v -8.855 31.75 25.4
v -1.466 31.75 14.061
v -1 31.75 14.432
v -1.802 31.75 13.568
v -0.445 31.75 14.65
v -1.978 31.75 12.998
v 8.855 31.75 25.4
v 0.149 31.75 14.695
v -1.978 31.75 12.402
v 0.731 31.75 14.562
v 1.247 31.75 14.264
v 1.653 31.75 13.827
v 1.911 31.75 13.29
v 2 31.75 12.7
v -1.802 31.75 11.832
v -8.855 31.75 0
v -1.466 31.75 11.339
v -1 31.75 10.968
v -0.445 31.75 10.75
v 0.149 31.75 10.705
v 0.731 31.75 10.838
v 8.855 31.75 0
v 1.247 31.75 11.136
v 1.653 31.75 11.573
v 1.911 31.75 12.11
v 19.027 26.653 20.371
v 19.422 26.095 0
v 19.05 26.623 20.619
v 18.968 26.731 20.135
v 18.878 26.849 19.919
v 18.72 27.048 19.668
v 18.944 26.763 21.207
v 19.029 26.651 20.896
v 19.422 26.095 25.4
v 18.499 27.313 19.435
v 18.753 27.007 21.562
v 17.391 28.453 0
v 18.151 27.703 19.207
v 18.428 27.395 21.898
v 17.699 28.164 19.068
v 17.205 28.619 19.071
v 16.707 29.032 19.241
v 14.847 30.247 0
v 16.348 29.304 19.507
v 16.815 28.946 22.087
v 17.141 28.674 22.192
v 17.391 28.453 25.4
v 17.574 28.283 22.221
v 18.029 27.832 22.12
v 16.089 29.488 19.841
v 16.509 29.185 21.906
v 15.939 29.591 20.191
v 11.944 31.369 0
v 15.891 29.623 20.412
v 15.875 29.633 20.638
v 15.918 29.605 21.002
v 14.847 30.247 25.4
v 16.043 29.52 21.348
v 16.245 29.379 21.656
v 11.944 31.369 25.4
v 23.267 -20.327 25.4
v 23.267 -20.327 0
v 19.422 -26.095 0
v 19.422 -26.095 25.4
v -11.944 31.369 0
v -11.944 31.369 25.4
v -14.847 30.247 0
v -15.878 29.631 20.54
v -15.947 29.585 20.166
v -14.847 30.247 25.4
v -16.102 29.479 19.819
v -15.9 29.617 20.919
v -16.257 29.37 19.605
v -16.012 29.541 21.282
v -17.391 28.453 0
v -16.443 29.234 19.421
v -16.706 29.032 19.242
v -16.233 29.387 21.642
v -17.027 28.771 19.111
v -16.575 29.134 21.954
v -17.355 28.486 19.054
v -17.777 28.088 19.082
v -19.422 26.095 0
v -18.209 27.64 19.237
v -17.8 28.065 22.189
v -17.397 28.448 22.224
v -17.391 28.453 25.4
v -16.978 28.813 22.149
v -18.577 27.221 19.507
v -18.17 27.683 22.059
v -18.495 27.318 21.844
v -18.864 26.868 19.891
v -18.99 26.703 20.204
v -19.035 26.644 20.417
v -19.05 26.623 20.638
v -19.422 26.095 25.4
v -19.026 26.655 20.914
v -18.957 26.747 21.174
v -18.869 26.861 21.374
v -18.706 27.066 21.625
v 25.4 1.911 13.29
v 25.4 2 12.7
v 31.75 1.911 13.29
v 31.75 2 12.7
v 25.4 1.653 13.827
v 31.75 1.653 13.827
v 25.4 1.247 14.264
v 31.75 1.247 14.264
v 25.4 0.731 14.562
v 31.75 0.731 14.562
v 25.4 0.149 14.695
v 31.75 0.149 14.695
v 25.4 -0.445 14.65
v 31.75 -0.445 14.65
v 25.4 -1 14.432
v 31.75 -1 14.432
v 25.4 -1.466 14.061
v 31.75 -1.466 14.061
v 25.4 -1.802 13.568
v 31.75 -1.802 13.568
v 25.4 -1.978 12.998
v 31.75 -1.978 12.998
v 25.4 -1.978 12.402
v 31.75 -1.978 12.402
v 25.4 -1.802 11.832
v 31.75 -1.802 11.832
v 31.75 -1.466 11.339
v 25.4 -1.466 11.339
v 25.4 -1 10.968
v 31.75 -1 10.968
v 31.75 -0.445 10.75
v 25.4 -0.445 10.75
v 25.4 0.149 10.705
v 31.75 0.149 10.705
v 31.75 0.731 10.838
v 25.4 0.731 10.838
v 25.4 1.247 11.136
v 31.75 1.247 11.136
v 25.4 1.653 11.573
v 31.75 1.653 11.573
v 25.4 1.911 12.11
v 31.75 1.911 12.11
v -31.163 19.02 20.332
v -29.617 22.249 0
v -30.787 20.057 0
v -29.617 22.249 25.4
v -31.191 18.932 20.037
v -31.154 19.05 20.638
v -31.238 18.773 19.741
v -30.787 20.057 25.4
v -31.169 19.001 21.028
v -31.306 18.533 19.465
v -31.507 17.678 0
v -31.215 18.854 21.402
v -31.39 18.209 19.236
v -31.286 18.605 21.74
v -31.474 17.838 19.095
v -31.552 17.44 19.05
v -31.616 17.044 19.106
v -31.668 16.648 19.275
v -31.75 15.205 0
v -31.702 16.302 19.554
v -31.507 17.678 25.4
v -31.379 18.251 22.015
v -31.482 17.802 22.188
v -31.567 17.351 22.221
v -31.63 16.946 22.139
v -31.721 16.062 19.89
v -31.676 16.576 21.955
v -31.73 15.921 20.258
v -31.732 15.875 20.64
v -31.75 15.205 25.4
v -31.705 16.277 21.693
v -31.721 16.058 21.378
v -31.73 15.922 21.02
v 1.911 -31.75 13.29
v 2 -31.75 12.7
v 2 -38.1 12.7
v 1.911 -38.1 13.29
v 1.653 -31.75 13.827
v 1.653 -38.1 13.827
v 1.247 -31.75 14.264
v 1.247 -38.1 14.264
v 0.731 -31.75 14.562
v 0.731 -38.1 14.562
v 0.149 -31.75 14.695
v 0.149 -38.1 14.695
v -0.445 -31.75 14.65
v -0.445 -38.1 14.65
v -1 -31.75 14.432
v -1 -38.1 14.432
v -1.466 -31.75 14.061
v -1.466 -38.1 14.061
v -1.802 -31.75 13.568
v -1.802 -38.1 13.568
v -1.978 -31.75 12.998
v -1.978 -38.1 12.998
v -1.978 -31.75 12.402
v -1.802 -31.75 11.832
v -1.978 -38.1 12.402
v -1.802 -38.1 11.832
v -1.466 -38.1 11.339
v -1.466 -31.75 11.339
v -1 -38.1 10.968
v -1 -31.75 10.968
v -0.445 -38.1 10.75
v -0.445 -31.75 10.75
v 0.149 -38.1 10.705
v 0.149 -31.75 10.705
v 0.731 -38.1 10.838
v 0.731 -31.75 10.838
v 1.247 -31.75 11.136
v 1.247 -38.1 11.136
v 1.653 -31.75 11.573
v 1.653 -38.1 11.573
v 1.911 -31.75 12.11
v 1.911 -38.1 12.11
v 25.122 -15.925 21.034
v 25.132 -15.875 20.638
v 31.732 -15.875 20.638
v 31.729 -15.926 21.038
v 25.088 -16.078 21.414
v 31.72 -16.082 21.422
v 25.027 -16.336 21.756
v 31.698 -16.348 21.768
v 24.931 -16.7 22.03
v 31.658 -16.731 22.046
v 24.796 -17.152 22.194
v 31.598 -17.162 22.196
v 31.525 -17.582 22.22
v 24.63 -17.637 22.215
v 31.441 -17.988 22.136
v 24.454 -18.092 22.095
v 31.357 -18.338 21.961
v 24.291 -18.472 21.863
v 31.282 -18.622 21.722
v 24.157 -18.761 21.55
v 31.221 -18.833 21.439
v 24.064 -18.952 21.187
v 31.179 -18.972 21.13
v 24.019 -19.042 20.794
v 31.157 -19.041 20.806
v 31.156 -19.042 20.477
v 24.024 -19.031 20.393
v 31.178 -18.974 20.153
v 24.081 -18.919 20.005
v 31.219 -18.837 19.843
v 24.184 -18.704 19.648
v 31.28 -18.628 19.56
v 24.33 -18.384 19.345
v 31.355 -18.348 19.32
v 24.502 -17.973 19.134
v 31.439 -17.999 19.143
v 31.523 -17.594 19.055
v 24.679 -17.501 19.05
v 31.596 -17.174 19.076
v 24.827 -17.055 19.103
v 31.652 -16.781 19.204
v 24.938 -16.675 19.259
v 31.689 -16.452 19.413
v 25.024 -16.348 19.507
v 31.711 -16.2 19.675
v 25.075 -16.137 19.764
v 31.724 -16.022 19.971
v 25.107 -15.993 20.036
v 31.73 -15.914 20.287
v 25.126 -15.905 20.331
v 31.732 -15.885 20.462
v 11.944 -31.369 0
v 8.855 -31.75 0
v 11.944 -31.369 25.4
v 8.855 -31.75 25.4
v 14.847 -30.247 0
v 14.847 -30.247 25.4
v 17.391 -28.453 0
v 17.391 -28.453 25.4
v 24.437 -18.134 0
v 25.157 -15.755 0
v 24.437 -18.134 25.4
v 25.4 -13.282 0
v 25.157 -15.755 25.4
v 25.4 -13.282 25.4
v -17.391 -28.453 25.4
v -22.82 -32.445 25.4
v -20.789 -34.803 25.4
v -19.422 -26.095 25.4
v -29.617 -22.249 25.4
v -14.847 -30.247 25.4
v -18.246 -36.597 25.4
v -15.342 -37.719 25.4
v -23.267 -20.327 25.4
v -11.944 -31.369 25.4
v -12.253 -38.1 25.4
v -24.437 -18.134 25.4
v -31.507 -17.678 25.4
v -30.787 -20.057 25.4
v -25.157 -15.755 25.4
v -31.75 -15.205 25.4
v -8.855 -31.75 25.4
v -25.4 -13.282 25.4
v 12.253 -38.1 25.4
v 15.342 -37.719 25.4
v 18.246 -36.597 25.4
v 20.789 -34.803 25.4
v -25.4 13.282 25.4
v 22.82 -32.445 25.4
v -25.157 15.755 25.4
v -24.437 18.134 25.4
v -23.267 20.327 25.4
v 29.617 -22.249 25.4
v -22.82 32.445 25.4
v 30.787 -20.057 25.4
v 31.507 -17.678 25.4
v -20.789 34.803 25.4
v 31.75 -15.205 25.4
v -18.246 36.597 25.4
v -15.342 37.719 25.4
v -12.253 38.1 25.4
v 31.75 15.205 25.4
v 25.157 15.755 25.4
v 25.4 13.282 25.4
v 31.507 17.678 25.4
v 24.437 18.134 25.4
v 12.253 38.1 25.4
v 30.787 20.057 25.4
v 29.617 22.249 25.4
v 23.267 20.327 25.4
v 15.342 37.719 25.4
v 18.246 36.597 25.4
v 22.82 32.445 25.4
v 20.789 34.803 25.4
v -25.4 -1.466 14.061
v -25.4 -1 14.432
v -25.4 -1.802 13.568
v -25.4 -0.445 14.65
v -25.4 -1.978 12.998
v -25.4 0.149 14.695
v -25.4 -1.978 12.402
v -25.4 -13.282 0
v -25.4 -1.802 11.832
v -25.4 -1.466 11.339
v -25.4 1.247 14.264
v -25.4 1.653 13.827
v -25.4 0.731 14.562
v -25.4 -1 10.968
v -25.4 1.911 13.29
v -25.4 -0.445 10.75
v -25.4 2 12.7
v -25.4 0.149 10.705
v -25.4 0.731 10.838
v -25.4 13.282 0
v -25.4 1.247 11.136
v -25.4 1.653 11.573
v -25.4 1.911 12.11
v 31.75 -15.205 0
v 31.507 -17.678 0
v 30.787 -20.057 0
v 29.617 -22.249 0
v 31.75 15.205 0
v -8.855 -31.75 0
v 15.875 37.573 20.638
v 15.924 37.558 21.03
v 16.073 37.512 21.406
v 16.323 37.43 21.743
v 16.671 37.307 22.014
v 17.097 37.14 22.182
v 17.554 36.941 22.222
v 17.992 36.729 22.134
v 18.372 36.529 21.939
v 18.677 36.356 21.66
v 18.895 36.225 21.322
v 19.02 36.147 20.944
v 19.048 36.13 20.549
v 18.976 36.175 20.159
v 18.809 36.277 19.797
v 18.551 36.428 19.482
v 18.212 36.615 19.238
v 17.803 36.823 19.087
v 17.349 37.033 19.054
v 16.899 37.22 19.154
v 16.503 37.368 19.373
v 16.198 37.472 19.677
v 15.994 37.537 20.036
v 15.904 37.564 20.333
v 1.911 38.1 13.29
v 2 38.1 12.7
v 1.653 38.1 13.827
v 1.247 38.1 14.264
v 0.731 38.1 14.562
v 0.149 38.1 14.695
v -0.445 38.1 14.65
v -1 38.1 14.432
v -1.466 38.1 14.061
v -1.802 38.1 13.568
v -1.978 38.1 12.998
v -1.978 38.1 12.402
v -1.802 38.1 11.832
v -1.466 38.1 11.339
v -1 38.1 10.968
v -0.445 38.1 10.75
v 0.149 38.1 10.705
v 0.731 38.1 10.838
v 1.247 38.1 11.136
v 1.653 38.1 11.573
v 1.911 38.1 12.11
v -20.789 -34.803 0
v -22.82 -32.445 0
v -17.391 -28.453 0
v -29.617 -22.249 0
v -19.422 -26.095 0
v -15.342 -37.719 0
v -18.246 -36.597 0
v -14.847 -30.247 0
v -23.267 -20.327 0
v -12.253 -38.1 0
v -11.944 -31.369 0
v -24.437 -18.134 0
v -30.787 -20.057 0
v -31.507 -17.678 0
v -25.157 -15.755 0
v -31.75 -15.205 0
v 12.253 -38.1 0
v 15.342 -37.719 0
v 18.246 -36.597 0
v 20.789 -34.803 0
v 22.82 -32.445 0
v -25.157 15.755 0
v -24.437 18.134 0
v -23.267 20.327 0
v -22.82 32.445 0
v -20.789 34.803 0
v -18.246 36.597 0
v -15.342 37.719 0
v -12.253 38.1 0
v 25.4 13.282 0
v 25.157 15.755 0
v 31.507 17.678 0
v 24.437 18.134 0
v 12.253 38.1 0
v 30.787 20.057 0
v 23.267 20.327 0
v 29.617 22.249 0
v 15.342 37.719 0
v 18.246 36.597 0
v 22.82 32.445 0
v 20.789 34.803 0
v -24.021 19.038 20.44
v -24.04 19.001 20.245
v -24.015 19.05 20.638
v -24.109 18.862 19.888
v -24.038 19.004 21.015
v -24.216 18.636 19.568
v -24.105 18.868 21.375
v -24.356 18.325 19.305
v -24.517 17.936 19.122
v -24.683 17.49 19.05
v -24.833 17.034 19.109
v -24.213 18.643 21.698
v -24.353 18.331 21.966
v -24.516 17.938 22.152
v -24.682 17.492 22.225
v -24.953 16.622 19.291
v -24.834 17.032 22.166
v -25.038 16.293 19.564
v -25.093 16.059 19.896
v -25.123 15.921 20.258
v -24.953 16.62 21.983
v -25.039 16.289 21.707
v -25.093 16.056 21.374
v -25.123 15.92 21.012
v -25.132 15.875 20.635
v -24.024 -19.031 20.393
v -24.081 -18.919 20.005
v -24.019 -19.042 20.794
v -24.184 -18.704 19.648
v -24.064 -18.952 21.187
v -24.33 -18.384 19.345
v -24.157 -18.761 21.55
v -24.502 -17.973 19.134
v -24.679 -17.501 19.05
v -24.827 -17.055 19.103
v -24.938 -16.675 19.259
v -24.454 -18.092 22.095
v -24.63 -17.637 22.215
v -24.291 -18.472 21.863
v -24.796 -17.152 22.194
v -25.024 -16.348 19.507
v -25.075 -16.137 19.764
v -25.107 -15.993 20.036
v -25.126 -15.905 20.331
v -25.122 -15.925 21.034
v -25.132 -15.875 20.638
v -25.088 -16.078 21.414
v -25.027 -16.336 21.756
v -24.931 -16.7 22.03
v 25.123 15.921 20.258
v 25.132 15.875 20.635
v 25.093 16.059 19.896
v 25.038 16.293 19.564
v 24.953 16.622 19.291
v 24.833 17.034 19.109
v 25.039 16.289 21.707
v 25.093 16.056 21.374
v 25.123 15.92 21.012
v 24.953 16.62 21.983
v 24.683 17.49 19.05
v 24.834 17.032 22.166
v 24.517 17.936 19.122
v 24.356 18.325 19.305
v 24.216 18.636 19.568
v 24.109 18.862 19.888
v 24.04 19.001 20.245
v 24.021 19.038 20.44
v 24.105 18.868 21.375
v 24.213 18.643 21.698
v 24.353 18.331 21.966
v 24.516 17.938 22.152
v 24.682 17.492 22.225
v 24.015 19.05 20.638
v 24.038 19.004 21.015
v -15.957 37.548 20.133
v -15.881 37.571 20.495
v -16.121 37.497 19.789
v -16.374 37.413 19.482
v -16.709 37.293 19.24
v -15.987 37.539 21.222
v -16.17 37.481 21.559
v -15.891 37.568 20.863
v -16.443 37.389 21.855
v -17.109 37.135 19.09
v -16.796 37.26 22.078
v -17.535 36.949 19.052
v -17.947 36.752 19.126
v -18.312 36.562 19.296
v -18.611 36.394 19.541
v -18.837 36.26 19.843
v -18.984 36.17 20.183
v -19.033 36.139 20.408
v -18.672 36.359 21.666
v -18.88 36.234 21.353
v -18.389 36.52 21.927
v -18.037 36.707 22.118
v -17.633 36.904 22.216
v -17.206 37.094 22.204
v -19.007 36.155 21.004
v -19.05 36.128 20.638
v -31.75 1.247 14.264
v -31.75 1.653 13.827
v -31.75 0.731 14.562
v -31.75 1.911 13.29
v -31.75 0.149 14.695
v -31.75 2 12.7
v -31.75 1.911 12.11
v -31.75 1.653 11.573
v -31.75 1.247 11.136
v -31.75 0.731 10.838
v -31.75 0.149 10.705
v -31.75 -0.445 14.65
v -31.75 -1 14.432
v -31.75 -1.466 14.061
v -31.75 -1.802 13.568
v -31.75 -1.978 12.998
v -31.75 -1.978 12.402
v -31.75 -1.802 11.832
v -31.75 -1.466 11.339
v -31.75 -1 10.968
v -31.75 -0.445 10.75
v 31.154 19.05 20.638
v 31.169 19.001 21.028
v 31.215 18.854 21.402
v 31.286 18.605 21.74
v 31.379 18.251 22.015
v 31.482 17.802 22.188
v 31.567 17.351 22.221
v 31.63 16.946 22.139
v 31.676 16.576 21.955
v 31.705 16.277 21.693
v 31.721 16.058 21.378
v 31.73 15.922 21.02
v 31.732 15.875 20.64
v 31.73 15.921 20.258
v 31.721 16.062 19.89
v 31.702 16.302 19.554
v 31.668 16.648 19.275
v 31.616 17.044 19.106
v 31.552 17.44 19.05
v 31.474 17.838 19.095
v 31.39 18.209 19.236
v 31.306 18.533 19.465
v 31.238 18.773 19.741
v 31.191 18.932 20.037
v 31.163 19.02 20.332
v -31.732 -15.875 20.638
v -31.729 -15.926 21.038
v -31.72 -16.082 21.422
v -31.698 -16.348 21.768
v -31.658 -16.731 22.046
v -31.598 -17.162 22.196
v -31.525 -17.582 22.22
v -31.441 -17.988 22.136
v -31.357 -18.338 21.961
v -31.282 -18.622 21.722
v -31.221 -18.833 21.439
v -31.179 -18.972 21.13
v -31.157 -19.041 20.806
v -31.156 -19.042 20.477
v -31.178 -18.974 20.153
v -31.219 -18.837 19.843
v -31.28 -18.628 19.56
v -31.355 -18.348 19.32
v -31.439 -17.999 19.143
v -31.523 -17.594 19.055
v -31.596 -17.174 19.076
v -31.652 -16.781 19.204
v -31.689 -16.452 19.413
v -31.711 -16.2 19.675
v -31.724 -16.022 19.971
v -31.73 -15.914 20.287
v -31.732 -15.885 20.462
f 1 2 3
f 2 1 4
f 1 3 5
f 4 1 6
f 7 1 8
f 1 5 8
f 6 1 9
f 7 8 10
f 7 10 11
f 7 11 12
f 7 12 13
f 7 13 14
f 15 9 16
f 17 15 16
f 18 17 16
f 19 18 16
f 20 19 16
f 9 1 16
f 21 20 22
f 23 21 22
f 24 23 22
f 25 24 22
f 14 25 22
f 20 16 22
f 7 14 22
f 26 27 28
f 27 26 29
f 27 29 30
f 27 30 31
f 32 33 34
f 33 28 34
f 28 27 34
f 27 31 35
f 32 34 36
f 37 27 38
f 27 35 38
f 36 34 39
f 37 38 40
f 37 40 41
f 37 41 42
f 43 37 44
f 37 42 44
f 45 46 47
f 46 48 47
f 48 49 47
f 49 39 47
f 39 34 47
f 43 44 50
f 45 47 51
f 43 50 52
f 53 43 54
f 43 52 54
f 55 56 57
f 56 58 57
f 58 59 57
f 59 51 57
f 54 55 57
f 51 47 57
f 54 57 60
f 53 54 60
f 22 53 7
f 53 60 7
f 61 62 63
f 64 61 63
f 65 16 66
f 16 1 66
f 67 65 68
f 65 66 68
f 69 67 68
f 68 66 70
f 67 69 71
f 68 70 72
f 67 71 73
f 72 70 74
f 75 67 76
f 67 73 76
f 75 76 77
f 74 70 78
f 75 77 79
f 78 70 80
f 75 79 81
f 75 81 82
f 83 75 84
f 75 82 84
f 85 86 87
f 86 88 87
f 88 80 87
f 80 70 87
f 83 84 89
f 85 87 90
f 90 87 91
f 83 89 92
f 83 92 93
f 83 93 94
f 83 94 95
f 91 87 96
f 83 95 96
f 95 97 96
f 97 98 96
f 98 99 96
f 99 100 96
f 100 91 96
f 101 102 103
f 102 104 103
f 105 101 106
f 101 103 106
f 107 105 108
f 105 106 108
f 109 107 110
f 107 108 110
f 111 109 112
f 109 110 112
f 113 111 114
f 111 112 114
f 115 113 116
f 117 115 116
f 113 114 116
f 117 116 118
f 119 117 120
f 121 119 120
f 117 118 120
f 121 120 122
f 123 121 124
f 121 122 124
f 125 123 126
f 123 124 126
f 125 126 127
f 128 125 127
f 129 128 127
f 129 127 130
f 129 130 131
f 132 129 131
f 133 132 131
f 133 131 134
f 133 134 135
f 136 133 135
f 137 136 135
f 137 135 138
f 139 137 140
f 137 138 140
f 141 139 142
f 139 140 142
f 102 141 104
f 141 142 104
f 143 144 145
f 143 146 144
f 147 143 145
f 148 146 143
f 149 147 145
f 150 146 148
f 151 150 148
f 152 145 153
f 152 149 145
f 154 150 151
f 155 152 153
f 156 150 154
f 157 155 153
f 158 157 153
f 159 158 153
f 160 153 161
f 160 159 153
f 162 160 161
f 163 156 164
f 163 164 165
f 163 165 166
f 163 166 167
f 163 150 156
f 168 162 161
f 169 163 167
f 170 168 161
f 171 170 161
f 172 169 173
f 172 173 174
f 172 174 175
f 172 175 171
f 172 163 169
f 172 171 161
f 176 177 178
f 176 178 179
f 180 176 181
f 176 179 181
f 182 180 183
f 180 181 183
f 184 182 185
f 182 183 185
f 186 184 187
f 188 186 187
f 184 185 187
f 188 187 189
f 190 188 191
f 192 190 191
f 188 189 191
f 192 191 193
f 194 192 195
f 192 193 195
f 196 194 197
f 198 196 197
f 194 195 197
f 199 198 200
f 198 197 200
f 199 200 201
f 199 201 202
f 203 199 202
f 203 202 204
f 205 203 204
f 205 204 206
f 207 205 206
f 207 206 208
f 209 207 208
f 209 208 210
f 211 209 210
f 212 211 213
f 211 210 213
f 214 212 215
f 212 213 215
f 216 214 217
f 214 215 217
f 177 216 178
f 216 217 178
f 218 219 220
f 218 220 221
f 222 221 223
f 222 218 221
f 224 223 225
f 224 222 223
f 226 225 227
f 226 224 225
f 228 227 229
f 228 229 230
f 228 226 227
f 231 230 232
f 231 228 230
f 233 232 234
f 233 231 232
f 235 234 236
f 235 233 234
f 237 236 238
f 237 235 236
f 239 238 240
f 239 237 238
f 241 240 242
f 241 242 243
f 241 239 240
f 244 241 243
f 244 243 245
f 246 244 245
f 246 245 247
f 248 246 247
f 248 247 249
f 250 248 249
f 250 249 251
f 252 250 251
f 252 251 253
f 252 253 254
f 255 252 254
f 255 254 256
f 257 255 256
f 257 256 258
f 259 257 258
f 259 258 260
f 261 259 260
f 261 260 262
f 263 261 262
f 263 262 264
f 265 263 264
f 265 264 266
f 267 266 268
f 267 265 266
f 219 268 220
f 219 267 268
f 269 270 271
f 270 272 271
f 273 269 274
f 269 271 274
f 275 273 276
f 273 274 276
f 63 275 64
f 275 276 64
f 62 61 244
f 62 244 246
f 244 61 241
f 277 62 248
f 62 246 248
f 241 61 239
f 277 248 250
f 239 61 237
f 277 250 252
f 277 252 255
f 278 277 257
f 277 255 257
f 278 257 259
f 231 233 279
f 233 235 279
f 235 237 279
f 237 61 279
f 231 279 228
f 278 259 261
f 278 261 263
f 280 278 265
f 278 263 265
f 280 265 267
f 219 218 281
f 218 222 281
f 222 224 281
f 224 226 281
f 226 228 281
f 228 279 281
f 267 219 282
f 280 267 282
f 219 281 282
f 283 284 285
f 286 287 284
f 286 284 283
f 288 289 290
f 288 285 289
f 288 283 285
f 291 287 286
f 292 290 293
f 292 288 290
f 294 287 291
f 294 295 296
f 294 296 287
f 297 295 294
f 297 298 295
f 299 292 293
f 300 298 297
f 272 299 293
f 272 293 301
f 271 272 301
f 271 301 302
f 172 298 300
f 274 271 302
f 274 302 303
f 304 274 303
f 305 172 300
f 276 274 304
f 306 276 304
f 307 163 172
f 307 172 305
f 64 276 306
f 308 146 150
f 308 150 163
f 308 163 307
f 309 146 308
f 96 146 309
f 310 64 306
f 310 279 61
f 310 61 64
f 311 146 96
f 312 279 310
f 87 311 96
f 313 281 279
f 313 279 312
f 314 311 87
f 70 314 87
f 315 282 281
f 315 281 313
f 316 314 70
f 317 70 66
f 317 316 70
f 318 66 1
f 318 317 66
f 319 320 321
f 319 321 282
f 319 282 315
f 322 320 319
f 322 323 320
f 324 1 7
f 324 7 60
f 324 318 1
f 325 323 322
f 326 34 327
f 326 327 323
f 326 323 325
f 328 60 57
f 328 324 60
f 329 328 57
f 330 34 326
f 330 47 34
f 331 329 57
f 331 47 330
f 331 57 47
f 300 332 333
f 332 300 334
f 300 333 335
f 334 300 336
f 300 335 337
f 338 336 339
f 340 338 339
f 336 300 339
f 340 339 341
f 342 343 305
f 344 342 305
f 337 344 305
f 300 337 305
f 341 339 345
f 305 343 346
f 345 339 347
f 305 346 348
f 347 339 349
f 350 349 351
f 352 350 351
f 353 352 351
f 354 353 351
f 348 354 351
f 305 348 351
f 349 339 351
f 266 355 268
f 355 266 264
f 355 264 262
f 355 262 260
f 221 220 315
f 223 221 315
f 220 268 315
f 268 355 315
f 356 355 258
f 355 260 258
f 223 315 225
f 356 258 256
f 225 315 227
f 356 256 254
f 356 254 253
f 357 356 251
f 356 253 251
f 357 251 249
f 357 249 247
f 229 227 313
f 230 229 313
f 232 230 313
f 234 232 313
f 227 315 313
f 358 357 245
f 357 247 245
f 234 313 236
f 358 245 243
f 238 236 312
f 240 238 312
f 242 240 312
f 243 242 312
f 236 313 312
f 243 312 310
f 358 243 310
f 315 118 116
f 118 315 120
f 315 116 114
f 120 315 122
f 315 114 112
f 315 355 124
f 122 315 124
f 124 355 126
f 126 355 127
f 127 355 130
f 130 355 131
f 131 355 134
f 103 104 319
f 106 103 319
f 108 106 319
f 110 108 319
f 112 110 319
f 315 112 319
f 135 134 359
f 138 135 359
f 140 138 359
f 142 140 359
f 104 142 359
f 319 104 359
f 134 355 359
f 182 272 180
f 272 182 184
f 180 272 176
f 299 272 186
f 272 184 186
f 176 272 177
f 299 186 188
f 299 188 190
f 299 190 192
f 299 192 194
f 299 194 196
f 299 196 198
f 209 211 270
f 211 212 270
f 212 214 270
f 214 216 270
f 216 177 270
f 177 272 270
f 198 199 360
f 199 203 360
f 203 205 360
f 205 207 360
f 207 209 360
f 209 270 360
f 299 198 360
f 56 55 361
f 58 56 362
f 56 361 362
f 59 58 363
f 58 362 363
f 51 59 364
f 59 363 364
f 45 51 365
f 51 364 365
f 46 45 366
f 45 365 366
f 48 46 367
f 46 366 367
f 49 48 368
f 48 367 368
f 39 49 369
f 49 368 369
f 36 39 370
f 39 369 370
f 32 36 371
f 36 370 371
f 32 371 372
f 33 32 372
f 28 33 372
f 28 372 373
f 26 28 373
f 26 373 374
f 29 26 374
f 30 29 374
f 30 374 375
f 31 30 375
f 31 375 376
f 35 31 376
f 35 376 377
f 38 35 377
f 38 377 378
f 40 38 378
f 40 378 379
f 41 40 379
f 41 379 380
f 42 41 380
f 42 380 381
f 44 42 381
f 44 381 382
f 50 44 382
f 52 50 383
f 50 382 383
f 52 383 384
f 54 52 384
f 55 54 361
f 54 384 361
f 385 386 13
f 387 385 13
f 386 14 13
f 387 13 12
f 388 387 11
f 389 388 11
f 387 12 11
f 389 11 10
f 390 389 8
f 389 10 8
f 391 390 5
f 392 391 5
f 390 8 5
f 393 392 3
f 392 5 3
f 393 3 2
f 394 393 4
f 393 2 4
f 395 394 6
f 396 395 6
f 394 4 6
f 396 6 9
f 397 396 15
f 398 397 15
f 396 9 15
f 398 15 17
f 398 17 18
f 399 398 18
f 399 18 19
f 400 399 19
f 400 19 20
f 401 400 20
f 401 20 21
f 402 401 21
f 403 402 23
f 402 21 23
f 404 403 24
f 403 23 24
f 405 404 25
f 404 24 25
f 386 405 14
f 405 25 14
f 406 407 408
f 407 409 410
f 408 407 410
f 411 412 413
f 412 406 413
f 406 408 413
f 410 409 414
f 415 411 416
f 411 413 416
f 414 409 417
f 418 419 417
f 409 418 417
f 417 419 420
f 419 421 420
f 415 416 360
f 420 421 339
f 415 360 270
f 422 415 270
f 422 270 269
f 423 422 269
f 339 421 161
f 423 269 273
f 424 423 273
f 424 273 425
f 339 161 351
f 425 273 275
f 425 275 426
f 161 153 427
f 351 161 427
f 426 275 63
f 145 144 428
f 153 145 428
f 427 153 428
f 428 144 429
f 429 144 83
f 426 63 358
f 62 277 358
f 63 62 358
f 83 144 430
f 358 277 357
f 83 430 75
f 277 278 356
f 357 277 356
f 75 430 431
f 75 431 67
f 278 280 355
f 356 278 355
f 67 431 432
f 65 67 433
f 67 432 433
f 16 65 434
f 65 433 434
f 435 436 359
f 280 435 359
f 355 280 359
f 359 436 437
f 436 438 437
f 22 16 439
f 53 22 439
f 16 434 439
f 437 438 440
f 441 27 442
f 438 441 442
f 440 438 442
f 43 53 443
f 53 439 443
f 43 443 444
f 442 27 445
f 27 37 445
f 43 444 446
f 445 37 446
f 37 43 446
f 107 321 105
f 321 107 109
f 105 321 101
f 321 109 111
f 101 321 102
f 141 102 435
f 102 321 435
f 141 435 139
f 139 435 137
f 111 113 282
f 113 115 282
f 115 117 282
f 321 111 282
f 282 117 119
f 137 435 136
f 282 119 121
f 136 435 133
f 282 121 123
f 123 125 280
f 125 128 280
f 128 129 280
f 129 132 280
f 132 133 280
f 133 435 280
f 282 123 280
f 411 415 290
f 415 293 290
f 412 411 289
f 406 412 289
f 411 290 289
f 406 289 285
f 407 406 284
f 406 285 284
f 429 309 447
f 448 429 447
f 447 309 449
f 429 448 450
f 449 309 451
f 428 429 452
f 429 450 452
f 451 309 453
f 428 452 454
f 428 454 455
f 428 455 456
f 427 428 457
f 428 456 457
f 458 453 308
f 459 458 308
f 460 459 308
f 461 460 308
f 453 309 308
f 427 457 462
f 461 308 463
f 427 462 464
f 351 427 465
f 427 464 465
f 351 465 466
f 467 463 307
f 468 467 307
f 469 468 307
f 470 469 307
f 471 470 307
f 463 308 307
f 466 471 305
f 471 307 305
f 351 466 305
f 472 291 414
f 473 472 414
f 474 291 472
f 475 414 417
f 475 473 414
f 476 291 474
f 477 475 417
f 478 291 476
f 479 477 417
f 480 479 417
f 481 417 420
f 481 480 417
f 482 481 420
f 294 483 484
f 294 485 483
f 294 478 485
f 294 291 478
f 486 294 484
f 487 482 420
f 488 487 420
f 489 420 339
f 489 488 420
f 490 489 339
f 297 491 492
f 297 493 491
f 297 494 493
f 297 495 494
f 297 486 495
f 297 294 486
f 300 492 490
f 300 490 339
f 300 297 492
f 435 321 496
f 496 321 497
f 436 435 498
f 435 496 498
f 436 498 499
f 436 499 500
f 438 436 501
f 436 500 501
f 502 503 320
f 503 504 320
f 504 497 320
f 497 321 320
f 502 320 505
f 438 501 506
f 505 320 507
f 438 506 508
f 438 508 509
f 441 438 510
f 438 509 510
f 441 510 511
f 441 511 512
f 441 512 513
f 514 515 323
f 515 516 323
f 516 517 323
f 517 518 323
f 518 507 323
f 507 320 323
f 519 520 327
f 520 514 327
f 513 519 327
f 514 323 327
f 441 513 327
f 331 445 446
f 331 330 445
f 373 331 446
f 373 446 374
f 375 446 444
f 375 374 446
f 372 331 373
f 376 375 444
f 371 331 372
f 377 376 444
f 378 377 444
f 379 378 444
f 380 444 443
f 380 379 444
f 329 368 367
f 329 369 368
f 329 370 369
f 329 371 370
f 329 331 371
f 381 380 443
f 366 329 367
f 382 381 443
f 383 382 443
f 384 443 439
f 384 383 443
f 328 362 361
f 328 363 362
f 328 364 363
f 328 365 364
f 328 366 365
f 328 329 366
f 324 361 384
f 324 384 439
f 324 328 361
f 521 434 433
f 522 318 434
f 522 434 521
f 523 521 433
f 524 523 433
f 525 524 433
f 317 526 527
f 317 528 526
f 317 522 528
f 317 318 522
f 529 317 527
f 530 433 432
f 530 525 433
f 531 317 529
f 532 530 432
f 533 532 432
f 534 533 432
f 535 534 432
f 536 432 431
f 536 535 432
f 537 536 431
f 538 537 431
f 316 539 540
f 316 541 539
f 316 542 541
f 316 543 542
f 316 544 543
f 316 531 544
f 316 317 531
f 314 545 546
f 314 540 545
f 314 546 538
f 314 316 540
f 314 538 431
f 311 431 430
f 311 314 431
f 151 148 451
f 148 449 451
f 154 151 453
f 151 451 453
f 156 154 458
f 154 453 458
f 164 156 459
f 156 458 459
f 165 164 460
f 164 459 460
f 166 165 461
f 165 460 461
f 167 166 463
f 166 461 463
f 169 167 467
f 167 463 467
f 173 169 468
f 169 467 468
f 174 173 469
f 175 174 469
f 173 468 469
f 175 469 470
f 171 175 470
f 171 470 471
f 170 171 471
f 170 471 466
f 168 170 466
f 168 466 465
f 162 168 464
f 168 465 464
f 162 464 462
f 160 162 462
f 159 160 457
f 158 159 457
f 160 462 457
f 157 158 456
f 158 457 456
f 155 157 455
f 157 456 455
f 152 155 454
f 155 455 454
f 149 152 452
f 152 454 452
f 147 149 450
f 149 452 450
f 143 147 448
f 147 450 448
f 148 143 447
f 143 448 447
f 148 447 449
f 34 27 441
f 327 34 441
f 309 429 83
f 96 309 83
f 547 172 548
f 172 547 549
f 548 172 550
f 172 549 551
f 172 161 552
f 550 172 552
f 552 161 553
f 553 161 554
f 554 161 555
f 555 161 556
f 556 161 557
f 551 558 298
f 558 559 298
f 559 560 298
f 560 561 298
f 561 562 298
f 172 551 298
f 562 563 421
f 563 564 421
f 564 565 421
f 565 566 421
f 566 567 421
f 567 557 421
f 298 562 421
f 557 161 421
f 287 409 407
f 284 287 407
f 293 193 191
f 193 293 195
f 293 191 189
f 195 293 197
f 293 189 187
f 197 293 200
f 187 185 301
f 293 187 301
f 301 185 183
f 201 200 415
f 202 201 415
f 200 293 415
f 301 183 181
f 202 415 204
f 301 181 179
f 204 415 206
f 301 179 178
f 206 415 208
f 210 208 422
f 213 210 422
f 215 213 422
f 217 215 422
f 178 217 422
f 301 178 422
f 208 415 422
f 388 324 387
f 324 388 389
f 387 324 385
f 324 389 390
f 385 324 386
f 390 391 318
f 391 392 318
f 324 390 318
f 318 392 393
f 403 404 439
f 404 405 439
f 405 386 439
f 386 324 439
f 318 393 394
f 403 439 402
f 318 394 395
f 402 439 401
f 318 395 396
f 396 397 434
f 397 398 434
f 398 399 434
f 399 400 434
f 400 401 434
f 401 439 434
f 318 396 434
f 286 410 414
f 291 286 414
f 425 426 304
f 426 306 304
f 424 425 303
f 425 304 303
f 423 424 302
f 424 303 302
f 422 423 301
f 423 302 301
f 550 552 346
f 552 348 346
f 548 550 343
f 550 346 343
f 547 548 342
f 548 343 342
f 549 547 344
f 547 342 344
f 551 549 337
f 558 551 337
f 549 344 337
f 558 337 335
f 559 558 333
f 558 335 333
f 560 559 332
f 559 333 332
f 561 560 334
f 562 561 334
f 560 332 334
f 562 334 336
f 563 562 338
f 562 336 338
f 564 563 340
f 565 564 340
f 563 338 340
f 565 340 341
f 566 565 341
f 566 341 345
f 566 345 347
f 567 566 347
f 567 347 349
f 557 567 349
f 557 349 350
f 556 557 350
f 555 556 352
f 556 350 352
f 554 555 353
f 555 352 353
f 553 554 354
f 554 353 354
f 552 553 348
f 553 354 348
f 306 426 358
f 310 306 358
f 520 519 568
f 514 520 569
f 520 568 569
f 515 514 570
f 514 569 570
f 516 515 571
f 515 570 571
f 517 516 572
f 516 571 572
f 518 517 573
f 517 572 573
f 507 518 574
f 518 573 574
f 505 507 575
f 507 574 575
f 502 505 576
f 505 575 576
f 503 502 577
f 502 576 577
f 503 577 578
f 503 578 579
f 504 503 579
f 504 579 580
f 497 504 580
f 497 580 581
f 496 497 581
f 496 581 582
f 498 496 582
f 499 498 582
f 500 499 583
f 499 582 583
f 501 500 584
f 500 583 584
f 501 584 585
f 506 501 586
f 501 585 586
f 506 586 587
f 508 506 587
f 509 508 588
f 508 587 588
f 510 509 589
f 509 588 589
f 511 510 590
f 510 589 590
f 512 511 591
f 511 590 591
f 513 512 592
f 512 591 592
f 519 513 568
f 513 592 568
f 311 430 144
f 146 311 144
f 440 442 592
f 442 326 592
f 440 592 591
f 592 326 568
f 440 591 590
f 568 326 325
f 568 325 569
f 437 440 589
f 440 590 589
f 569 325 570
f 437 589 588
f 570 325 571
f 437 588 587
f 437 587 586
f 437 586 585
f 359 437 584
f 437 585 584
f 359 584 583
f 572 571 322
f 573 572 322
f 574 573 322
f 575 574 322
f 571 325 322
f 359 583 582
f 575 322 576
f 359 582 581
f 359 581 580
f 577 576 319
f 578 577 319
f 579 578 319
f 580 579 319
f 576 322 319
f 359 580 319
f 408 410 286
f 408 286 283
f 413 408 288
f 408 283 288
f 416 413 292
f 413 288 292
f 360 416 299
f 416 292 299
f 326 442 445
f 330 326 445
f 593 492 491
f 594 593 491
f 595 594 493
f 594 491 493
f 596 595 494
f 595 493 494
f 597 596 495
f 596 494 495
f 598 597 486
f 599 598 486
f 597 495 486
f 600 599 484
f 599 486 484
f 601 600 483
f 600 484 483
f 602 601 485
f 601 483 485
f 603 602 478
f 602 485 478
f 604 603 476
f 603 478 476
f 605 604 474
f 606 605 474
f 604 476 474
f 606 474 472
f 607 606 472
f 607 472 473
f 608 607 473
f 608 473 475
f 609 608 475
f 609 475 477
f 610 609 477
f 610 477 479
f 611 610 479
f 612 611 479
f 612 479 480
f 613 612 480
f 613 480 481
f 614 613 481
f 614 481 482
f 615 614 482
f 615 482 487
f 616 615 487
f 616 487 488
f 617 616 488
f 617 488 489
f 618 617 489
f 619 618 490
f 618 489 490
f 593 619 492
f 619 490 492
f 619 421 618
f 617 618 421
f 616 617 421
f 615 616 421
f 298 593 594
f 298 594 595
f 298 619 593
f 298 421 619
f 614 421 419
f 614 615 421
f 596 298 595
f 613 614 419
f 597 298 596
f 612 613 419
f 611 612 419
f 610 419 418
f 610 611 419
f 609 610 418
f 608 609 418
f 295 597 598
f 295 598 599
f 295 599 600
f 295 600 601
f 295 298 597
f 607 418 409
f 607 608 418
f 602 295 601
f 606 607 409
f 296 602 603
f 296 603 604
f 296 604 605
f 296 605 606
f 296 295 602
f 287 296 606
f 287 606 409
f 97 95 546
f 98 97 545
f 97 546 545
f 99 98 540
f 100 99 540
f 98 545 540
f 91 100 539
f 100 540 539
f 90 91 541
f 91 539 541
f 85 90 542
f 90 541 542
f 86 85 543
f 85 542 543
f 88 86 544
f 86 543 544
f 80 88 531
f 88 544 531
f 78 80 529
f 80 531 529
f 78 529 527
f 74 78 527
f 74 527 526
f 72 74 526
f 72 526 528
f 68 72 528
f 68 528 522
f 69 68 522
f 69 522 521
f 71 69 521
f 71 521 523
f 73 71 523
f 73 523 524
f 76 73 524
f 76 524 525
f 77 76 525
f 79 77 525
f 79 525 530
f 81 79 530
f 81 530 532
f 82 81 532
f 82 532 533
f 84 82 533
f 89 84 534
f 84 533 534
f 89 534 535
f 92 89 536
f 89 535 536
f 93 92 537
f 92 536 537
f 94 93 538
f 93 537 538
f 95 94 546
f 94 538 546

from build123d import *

# Parameters (mm, degrees)
F1_DEPTH  = 25.4
F2_R      = 2.00025
F3_DEPTH  = 39.6875
F4_R      = 2.00025
F5_DEPTH  = 41.275
F6_R      = 12.7
F7_R      = 1.5875
F8_DEPTH  = 25.4
F9_R      = 1.5875
F10_DEPTH = 38.1


with BuildPart() as f1:
    # F0 (on Top) → F1 (new body)
    with BuildSketch(Plane.XY):
        Polygon((31.75, 19.05), (19.05, 38.1), (-19.05, 38.1), (-31.75, 19.05), (-31.75, -19.05), (-19.05, -38.1), (19.05, -38.1), (31.75, -19.05), align=None)
        Polygon((-25.4, -17.1273747004), (-25.4, 17.1273747004), (-15.6515831336, 31.75), (15.6515831336, 31.75), (25.4, 17.1273747004), (25.4, -17.1273747004), (15.6515831336, -31.75), (-15.6515831336, -31.75), align=None, mode=Mode.SUBTRACT)
    extrude(amount=F1_DEPTH)

    # F2 (on Front) → F3 (cut, symmetric)
    with BuildSketch(Plane.XZ):
        with Locations((0, 12.7)):
            Circle(F2_R)
    extrude(amount=F3_DEPTH, both=True, mode=Mode.SUBTRACT)

    # F4 (on Right) → F5 (cut, symmetric)
    with BuildSketch(Plane.YZ):
        with Locations((0, 12.7)):
            Circle(F4_R)
    extrude(amount=F5_DEPTH, both=True, mode=Mode.SUBTRACT)

    # F6
    f6_edges = [f1.edges().sort_by_distance(p)[0] for p in [
        (-25.4, 17.127375, 12.7),
        (-15.651583, 31.75, 12.7),
        (15.651583, 31.75, 12.7),
        (25.4, 17.127375, 12.7),
        (25.4, -17.127375, 12.7),
        (15.651583, -31.75, 12.7),
        (-15.651583, -31.75, 12.7),
        (-25.4, -17.127375, 12.7),
        (-19.05, -38.1, 12.7),
        (-31.75, -19.05, 12.7),
        (19.05, -38.1, 12.7),
        (31.75, -19.05, 12.7),
        (31.75, 19.05, 12.7),
        (19.05, 38.1, 12.7),
        (-19.05, 38.1, 12.7),
        (-31.75, 19.05, 12.7),
    ]]
    fillet(f6_edges, radius=F6_R)

    # F7 (on face) → F8 (cut)
    with BuildSketch(Plane(origin=(0, 38.1, 0), x_dir=(-1, 0, 0), z_dir=(0, 1, 0))):
        with Locations((-17.4625, 20.6375)):
            Circle(F7_R)
        with Locations((17.4625, 20.6375)):
            Circle(F7_R)
    extrude(amount=-F8_DEPTH, mode=Mode.SUBTRACT)

    # F9 (on Right) → F10 (cut, symmetric)
    with BuildSketch(Plane.YZ):
        with Locations((-17.4625, 20.6375)):
            Circle(F9_R)
        with Locations((17.4625, 20.6375)):
            Circle(F9_R)
    extrude(amount=F10_DEPTH, both=True, mode=Mode.SUBTRACT)


solid = f1.part
